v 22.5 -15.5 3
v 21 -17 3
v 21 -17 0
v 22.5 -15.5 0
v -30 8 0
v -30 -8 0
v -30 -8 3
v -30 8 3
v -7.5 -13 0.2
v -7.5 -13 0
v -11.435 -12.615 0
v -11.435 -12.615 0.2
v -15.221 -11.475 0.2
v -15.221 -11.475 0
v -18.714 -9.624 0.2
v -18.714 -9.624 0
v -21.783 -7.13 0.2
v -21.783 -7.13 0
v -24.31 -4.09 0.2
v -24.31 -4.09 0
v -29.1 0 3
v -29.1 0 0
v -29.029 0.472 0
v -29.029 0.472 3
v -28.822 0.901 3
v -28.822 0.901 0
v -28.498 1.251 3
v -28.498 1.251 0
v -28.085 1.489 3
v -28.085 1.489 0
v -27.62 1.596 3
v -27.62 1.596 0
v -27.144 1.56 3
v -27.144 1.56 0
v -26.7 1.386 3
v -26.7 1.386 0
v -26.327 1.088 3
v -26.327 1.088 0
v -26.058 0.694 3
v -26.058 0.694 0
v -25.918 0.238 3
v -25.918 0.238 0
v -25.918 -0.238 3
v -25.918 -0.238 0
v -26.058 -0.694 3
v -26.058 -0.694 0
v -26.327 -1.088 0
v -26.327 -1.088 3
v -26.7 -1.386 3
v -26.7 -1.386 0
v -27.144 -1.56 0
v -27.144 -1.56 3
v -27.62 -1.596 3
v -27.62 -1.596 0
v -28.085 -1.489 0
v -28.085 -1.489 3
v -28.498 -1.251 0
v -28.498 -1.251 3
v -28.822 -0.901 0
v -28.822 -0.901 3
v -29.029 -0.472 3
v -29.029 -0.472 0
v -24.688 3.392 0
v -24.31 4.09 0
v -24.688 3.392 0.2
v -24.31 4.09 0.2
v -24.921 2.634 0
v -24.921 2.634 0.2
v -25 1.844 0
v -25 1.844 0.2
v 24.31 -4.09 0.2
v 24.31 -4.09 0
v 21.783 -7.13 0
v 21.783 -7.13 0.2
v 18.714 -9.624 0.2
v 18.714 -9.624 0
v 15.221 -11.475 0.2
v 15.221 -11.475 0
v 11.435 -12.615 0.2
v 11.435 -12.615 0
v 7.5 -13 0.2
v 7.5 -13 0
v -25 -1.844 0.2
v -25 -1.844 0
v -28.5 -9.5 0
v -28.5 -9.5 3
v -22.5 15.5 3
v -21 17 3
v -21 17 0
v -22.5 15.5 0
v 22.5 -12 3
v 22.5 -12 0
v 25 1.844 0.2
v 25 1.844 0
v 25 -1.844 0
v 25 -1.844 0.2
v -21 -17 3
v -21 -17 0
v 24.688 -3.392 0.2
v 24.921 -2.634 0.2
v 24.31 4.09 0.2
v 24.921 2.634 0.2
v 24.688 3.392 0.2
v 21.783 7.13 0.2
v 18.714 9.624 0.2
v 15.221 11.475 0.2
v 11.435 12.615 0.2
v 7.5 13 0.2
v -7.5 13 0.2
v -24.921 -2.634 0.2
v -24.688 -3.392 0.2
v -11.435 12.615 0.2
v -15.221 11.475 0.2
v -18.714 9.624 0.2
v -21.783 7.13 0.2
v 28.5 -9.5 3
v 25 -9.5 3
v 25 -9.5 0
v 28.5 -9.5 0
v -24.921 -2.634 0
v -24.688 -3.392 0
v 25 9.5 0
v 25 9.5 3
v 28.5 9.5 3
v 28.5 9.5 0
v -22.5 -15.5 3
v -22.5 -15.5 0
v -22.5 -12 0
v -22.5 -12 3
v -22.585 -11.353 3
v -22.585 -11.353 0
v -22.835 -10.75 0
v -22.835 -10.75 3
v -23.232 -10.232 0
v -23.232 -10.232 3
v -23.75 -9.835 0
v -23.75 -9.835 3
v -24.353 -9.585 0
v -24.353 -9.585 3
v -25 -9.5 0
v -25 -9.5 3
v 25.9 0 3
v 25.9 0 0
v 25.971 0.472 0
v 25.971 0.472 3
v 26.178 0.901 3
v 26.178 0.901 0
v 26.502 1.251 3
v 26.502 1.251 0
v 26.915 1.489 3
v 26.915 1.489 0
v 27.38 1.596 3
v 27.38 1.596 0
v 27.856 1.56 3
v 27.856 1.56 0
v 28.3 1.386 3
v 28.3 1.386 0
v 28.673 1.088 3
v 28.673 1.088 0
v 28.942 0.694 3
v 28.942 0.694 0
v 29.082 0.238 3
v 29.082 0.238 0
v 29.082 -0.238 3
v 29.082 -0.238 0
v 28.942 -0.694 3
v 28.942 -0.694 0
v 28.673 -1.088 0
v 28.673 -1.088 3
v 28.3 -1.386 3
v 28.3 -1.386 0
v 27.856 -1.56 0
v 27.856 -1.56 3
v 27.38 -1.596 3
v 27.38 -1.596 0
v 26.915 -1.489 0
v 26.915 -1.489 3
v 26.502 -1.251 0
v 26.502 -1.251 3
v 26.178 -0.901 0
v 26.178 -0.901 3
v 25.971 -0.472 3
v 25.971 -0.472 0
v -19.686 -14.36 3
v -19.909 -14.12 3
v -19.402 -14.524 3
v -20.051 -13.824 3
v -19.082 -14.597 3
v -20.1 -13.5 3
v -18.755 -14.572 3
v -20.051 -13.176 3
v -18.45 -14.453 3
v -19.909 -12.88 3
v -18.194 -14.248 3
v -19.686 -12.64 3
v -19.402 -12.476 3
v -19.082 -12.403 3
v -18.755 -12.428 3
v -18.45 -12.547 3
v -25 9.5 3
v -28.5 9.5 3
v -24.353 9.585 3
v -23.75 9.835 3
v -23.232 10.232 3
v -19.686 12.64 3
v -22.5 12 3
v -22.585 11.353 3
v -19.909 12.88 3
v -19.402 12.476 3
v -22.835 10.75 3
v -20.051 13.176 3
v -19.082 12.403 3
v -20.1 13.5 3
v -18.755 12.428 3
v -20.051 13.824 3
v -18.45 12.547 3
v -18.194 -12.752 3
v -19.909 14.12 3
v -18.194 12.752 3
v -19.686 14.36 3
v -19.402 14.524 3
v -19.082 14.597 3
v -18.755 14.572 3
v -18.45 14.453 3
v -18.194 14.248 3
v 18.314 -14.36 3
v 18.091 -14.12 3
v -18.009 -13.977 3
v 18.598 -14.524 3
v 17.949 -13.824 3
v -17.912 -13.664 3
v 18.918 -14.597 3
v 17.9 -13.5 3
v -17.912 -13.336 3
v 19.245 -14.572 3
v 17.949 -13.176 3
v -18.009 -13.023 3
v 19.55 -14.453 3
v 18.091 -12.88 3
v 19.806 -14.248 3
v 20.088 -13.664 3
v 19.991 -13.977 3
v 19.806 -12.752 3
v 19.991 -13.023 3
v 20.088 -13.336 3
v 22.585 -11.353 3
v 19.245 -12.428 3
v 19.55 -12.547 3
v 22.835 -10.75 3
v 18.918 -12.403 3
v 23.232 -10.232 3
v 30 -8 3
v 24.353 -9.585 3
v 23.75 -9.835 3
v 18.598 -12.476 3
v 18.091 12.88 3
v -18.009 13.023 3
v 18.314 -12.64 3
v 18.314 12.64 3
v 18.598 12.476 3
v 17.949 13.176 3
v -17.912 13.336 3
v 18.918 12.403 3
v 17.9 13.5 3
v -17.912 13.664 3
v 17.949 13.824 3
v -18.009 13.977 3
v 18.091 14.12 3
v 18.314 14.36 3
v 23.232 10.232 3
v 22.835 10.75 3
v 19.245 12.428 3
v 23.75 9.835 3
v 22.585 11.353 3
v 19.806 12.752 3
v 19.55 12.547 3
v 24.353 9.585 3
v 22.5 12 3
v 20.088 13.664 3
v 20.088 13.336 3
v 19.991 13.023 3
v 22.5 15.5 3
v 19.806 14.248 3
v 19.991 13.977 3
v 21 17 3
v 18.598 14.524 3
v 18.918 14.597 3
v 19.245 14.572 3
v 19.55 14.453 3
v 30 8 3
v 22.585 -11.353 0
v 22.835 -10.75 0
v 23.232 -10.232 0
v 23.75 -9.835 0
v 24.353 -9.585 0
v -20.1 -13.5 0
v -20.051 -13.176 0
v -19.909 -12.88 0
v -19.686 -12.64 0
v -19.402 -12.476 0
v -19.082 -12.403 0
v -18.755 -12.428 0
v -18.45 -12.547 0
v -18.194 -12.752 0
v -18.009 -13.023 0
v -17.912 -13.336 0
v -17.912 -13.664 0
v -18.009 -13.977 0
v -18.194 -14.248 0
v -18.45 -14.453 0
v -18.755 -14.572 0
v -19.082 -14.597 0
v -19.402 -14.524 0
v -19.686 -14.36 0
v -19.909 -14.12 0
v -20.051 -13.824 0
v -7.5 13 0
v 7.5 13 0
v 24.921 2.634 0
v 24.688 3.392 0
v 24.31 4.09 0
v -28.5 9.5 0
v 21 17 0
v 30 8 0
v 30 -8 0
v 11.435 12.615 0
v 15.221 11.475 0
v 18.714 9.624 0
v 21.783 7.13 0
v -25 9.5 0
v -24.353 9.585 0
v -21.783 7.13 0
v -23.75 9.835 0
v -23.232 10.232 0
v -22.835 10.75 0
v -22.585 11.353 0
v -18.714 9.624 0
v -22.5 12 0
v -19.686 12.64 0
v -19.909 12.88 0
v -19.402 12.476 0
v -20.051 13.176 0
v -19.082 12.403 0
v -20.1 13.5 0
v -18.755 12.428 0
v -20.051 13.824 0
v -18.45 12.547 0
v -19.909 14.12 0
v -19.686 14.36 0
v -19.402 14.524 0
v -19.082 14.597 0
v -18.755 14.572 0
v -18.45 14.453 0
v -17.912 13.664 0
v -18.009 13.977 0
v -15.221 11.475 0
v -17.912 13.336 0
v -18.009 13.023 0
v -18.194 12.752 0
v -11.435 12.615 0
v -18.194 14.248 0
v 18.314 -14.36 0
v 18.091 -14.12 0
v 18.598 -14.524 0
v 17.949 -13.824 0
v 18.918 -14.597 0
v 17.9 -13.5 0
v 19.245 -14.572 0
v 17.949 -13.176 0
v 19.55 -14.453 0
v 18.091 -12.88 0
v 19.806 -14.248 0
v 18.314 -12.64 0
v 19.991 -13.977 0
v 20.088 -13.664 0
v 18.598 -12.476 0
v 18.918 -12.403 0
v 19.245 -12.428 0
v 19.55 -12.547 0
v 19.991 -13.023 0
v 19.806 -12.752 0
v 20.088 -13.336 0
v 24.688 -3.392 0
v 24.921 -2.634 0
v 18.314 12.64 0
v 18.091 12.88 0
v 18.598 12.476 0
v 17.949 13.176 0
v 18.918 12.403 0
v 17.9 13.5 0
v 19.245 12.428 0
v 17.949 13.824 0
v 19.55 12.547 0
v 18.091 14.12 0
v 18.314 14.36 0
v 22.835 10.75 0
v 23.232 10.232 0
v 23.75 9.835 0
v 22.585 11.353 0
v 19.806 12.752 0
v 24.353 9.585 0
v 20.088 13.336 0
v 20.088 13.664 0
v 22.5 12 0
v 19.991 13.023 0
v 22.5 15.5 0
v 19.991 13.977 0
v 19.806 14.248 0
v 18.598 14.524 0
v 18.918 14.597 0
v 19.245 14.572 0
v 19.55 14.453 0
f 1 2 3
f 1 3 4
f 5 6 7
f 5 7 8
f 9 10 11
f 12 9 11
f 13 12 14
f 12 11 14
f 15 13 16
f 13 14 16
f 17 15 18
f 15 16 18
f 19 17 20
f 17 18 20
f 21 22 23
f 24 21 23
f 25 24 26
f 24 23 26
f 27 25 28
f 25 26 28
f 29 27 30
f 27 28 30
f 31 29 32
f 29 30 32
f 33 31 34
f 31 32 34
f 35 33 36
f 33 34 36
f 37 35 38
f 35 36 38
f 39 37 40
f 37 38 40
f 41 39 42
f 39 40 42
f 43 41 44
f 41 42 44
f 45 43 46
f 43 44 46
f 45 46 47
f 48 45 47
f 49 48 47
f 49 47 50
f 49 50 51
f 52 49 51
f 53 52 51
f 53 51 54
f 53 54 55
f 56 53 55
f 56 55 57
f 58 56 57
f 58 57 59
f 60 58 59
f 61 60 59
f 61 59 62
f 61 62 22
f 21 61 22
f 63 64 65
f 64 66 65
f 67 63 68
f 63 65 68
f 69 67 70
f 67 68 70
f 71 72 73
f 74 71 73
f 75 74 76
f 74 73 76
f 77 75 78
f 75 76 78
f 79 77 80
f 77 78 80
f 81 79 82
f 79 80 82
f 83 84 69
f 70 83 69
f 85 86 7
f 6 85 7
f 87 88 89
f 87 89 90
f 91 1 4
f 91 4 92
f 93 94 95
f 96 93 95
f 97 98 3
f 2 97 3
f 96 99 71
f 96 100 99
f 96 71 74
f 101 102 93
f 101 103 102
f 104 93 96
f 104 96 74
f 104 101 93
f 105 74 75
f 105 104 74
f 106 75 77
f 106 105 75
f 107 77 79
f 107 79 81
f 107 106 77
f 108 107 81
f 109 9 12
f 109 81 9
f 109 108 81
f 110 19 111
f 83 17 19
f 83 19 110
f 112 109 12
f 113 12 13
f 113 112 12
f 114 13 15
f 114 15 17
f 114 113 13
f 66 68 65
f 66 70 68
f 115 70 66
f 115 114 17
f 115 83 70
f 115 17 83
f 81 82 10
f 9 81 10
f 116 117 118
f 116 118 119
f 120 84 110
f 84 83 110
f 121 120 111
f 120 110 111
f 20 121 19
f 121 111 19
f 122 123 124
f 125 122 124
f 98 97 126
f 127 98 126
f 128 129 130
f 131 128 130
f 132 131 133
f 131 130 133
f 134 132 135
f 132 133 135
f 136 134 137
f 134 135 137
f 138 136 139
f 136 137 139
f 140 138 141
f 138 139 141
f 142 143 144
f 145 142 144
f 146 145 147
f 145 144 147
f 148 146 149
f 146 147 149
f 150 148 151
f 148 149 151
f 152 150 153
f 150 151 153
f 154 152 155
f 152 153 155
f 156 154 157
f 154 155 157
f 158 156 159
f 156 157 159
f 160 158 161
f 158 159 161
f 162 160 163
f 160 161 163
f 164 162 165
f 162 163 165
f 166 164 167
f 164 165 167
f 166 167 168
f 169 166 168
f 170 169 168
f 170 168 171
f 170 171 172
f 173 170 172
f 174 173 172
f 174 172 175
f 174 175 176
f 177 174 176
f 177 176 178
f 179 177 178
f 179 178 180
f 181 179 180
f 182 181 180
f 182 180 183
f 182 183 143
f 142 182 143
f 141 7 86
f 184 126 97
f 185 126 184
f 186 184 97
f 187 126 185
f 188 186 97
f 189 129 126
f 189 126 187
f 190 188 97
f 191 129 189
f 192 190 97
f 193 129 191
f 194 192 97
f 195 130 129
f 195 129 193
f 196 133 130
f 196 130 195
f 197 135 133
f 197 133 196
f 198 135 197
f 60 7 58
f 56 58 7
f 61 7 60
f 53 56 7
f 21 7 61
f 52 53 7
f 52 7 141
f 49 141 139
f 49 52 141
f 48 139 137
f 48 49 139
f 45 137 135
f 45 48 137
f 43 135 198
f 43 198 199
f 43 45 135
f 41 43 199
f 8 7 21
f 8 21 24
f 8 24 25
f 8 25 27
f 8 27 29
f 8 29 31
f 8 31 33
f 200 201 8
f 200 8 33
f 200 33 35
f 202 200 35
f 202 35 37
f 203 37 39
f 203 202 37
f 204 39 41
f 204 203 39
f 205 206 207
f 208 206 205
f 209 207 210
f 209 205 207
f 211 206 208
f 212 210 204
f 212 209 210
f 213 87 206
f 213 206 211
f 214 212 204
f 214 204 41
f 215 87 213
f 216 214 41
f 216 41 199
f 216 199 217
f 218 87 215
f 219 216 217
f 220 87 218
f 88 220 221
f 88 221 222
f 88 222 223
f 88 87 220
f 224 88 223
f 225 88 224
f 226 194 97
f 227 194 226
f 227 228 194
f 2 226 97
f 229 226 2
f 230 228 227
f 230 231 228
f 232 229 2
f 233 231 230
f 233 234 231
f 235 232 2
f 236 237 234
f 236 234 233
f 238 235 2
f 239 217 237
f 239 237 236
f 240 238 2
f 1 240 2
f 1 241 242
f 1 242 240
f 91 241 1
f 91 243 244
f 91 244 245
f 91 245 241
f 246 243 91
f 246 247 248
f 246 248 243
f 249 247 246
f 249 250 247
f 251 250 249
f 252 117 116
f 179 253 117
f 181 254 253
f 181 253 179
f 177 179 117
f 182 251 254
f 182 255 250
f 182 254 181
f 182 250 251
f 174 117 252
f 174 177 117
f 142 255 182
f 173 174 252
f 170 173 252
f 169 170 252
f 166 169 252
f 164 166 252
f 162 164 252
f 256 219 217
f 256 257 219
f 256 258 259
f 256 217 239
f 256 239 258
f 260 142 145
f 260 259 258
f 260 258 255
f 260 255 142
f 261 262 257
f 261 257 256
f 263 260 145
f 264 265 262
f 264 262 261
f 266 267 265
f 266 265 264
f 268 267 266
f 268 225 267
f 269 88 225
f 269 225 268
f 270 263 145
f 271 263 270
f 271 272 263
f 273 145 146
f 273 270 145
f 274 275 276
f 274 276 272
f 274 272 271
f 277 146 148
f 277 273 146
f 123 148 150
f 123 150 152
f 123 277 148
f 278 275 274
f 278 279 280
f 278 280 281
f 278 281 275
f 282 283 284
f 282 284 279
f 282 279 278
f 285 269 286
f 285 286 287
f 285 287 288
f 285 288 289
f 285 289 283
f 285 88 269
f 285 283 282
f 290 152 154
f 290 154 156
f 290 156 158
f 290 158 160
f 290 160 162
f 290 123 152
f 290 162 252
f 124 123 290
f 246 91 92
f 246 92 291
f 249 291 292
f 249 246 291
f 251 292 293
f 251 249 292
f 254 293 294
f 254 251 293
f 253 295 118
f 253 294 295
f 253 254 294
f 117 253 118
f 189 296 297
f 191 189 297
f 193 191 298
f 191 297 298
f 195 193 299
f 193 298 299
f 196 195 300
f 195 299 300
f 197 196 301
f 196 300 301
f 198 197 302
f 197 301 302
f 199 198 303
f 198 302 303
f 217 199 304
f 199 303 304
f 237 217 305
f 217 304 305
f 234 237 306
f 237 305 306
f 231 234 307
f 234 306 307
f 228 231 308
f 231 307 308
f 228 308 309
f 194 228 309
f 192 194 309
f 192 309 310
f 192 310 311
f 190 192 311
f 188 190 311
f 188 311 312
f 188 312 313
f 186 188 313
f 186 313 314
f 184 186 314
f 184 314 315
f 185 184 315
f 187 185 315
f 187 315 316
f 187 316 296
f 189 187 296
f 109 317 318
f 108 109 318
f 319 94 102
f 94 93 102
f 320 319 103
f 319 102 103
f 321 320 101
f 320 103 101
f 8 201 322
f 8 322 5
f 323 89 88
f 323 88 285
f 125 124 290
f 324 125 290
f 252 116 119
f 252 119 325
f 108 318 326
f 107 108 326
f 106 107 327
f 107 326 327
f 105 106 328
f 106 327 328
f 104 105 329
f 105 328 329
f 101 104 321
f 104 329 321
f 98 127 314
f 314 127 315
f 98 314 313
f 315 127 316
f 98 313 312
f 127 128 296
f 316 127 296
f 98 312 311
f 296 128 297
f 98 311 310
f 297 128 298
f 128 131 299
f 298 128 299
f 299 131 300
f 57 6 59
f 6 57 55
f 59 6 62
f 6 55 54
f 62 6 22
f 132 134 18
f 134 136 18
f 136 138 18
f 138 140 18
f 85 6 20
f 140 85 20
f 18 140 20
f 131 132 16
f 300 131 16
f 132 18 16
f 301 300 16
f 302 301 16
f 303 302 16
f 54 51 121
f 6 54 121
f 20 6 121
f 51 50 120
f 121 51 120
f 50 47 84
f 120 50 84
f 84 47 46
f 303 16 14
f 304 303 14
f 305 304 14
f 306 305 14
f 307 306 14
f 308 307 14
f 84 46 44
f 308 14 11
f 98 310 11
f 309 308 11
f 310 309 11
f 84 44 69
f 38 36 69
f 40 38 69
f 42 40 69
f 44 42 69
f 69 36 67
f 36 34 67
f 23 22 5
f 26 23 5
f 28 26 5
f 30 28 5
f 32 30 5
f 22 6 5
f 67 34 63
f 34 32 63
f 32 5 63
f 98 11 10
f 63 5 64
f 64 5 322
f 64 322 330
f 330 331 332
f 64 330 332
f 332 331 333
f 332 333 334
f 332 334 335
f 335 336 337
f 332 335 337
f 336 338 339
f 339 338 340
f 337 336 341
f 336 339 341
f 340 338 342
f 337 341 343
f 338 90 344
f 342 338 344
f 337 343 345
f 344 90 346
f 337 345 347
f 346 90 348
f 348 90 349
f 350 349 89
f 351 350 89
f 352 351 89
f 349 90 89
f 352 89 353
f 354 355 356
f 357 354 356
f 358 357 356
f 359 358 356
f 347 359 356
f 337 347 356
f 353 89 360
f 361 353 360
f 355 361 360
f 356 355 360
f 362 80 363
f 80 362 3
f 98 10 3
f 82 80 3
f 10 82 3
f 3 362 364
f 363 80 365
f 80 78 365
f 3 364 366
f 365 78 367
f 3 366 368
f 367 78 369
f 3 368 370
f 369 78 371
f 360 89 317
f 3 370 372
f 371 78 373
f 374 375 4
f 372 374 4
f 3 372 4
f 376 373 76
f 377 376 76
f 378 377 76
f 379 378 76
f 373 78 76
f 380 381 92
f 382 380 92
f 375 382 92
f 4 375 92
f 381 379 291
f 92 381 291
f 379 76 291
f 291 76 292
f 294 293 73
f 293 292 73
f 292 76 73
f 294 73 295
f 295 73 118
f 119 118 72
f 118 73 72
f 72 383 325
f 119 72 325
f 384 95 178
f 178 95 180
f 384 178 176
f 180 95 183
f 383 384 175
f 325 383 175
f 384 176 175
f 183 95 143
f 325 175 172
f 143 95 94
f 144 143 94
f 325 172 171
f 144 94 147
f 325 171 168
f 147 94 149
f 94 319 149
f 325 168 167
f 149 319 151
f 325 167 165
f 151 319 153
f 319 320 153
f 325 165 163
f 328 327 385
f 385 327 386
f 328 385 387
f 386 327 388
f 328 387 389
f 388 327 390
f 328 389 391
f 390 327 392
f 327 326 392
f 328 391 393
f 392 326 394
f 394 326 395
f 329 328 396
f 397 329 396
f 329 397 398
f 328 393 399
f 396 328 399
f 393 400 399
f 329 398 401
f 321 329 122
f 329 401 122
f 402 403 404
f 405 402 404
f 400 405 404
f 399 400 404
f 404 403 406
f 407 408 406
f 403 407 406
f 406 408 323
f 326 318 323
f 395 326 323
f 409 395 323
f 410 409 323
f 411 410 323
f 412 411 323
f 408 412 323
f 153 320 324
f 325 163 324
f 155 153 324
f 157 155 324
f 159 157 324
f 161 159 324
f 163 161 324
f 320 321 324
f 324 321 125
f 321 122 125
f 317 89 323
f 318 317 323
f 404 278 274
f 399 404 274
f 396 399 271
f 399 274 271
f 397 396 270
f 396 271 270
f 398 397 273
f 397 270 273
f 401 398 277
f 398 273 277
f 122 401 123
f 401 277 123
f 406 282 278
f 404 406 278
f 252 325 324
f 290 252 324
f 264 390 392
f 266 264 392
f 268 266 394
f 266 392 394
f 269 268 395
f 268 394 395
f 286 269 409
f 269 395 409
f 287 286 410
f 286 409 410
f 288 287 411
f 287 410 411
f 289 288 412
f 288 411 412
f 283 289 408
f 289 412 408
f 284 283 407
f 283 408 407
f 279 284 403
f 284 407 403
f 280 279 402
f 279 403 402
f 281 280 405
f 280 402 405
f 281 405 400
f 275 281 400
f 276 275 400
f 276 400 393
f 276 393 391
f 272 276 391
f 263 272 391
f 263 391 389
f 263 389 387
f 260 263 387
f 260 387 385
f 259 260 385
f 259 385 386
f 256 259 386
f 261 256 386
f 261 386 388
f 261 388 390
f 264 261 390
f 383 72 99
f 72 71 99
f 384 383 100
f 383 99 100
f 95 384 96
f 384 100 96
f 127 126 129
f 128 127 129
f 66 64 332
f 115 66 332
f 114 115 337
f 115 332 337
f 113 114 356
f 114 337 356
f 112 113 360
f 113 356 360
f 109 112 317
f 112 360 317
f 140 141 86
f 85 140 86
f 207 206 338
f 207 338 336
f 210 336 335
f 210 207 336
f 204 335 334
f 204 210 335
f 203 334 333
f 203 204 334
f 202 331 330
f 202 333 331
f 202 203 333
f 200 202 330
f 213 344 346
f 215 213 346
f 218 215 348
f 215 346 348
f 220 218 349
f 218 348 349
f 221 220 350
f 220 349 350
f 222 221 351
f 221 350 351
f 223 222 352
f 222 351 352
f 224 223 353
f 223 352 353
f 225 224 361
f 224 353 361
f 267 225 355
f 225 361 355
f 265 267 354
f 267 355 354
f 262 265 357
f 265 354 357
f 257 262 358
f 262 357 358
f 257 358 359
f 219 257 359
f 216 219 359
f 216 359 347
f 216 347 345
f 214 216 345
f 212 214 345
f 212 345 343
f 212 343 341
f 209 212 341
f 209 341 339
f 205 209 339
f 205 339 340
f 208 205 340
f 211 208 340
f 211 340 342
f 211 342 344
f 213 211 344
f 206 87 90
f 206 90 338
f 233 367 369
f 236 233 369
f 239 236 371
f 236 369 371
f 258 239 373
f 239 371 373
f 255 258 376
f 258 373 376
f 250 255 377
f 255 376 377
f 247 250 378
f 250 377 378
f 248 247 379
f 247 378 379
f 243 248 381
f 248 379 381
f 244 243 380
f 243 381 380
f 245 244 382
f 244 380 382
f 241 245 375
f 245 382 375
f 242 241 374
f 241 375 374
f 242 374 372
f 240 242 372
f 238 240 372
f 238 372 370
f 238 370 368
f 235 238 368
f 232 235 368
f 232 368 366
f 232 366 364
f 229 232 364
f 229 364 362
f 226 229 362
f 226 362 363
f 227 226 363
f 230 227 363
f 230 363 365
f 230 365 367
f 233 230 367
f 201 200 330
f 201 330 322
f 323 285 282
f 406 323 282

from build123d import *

# Parameters (mm, degrees)
SKETCH1_W                = 60
SKETCH1_H                = 34
BOSS_EXTRUDE1_DEPTH      = 3
CUT_EXTRUDE1_REACH       = 5
M2_CLEARANCE_HOLE1_D     = 2.2
M2_CLEARANCE_HOLE1_DEPTH = 3
M3_CLEARANCE_HOLE1_D     = 3.2
M3_CLEARANCE_HOLE1_DEPTH = 3
CUT_EXTRUDE2_DEPTH       = 0.2
FILLET2_R                = 4


with BuildPart() as part:
    # Sketch1 → Boss-Extrude1 (new body)
    with BuildSketch(Plane.XY):
        Rectangle(SKETCH1_W, SKETCH1_H)
    extrude(amount=BOSS_EXTRUDE1_DEPTH)

    # Sketch2 → Cut-Extrude1 (cut, up to next)
    with BuildSketch(Plane.XY.offset(3), mode=Mode.PRIVATE) as cut_extrude1_sk1:
        with BuildLine():
            Line((21, 17), (22.5, 15.5))
            Line((22.5, 15.5), (22.5, 12))
            ThreePointArc((22.5, 12), (23.232233047, 10.232233047), (25, 9.5))
            Line((25, 9.5), (28.5, 9.5))
            Line((28.5, 9.5), (30, 8))
            Line((30, 8), (30, 17))
            Line((30, 17), (21, 17))
        make_face()
    cut_extrude1_tool1 = extrude(cut_extrude1_sk1.sketch, amount=-CUT_EXTRUDE1_REACH, mode=Mode.PRIVATE) & part.part
    add(cut_extrude1_tool1.solids().sort_by_distance((26.30521, 13.30521, 3))[0], mode=Mode.SUBTRACT)
    # Sketch2 → Cut-Extrude1 (cut, up to next)
    with BuildSketch(Plane.XY.offset(3), mode=Mode.PRIVATE) as cut_extrude1_sk2:
        with BuildLine():
            Line((-30, 17), (-21, 17))
            Line((-21, 17), (-22.5, 15.5))
            Line((-22.5, 15.5), (-22.5, 12))
            ThreePointArc((-22.5, 12), (-23.232233047, 10.232233047), (-25, 9.5))
            Line((-25, 9.5), (-28.5, 9.5))
            Line((-28.5, 9.5), (-30, 8))
            Line((-30, 8), (-30, 17))
        make_face()
    cut_extrude1_tool2 = extrude(cut_extrude1_sk2.sketch, amount=-CUT_EXTRUDE1_REACH, mode=Mode.PRIVATE) & part.part
    add(cut_extrude1_tool2.solids().sort_by_distance((-26.30521, 13.30521, 3))[0], mode=Mode.SUBTRACT)
    # Sketch2 → Cut-Extrude1 (cut, up to next)
    with BuildSketch(Plane.XY.offset(3), mode=Mode.PRIVATE) as cut_extrude1_sk3:
        with BuildLine():
            Line((30, -8), (30, -17))
            Line((30, -17), (21, -17))
            Line((21, -17), (22.5, -15.5))
            Line((22.5, -15.5), (22.5, -12))
            ThreePointArc((22.5, -12), (23.232233047, -10.232233047), (25, -9.5))
            Line((25, -9.5), (28.5, -9.5))
            Line((28.5, -9.5), (30, -8))
        make_face()
    cut_extrude1_tool3 = extrude(cut_extrude1_sk3.sketch, amount=-CUT_EXTRUDE1_REACH, mode=Mode.PRIVATE) & part.part
    add(cut_extrude1_tool3.solids().sort_by_distance((26.30521, -13.30521, 3))[0], mode=Mode.SUBTRACT)
    # Sketch2 → Cut-Extrude1 (cut, up to next)
    with BuildSketch(Plane.XY.offset(3), mode=Mode.PRIVATE) as cut_extrude1_sk4:
        with BuildLine():
            Line((-22.5, -15.5), (-22.5, -12))
            ThreePointArc((-22.5, -12), (-23.232233047, -10.232233047), (-25, -9.5))
            Line((-25, -9.5), (-28.5, -9.5))
            Line((-28.5, -9.5), (-30, -8))
            Line((-30, -8), (-30, -17))
            Line((-30, -17), (-21, -17))
            Line((-21, -17), (-22.5, -15.5))
        make_face()
    cut_extrude1_tool4 = extrude(cut_extrude1_sk4.sketch, amount=-CUT_EXTRUDE1_REACH, mode=Mode.PRIVATE) & part.part
    add(cut_extrude1_tool4.solids().sort_by_distance((-26.30521, -13.30521, 3))[0], mode=Mode.SUBTRACT)

    # M2 Clearance Hole1
    with Locations(Plane.XY.offset(3)):
        with Locations((19, 13.5), (-19, -13.5), (-19, 13.5), (19, -13.5)):
            Hole(M2_CLEARANCE_HOLE1_D / 2, depth=M2_CLEARANCE_HOLE1_DEPTH)

    # M3 Clearance Hole1
    with Locations(Plane.XY.offset(3)):
        with Locations((-27.5, 0), (27.5, 0)):
            Hole(M3_CLEARANCE_HOLE1_D / 2, depth=M3_CLEARANCE_HOLE1_DEPTH)

    # Sketch7 → Cut-Extrude2 (cut)
    with BuildSketch(Plane(origin=(0, 0, 0), x_dir=(-1, 0, 0), z_dir=(0, 0, -1))):
        with BuildLine():
            Line((-7.5, -13), (7.5, -13))
            ThreePointArc((7.5, -13), (17.577822185, -10.323688824), (25, -3))
            Line((25, -3), (25, 3))
            ThreePointArc((25, 3), (17.577822185, 10.323688824), (7.5, 13))
            Line((7.5, 13), (-7.5, 13))
            ThreePointArc((-7.5, 13), (-17.577822185, 10.323688824), (-25, 3))
            Line((-25, 3), (-25, -3))
            ThreePointArc((-25, -3), (-17.577822185, -10.323688824), (-7.5, -13))
        make_face()
    extrude(amount=-CUT_EXTRUDE2_DEPTH, mode=Mode.SUBTRACT)

    # Fillet2
    fillet2_edges = [part.edges().sort_by_distance(p)[0] for p in [
        (25, -3, 0.1),
        (25, 3, 0.1),
        (-25, 3, 0.1),
        (-25, -3, 0.1),
    ]]
    fillet(fillet2_edges, radius=FILLET2_R)


solid = part.part
